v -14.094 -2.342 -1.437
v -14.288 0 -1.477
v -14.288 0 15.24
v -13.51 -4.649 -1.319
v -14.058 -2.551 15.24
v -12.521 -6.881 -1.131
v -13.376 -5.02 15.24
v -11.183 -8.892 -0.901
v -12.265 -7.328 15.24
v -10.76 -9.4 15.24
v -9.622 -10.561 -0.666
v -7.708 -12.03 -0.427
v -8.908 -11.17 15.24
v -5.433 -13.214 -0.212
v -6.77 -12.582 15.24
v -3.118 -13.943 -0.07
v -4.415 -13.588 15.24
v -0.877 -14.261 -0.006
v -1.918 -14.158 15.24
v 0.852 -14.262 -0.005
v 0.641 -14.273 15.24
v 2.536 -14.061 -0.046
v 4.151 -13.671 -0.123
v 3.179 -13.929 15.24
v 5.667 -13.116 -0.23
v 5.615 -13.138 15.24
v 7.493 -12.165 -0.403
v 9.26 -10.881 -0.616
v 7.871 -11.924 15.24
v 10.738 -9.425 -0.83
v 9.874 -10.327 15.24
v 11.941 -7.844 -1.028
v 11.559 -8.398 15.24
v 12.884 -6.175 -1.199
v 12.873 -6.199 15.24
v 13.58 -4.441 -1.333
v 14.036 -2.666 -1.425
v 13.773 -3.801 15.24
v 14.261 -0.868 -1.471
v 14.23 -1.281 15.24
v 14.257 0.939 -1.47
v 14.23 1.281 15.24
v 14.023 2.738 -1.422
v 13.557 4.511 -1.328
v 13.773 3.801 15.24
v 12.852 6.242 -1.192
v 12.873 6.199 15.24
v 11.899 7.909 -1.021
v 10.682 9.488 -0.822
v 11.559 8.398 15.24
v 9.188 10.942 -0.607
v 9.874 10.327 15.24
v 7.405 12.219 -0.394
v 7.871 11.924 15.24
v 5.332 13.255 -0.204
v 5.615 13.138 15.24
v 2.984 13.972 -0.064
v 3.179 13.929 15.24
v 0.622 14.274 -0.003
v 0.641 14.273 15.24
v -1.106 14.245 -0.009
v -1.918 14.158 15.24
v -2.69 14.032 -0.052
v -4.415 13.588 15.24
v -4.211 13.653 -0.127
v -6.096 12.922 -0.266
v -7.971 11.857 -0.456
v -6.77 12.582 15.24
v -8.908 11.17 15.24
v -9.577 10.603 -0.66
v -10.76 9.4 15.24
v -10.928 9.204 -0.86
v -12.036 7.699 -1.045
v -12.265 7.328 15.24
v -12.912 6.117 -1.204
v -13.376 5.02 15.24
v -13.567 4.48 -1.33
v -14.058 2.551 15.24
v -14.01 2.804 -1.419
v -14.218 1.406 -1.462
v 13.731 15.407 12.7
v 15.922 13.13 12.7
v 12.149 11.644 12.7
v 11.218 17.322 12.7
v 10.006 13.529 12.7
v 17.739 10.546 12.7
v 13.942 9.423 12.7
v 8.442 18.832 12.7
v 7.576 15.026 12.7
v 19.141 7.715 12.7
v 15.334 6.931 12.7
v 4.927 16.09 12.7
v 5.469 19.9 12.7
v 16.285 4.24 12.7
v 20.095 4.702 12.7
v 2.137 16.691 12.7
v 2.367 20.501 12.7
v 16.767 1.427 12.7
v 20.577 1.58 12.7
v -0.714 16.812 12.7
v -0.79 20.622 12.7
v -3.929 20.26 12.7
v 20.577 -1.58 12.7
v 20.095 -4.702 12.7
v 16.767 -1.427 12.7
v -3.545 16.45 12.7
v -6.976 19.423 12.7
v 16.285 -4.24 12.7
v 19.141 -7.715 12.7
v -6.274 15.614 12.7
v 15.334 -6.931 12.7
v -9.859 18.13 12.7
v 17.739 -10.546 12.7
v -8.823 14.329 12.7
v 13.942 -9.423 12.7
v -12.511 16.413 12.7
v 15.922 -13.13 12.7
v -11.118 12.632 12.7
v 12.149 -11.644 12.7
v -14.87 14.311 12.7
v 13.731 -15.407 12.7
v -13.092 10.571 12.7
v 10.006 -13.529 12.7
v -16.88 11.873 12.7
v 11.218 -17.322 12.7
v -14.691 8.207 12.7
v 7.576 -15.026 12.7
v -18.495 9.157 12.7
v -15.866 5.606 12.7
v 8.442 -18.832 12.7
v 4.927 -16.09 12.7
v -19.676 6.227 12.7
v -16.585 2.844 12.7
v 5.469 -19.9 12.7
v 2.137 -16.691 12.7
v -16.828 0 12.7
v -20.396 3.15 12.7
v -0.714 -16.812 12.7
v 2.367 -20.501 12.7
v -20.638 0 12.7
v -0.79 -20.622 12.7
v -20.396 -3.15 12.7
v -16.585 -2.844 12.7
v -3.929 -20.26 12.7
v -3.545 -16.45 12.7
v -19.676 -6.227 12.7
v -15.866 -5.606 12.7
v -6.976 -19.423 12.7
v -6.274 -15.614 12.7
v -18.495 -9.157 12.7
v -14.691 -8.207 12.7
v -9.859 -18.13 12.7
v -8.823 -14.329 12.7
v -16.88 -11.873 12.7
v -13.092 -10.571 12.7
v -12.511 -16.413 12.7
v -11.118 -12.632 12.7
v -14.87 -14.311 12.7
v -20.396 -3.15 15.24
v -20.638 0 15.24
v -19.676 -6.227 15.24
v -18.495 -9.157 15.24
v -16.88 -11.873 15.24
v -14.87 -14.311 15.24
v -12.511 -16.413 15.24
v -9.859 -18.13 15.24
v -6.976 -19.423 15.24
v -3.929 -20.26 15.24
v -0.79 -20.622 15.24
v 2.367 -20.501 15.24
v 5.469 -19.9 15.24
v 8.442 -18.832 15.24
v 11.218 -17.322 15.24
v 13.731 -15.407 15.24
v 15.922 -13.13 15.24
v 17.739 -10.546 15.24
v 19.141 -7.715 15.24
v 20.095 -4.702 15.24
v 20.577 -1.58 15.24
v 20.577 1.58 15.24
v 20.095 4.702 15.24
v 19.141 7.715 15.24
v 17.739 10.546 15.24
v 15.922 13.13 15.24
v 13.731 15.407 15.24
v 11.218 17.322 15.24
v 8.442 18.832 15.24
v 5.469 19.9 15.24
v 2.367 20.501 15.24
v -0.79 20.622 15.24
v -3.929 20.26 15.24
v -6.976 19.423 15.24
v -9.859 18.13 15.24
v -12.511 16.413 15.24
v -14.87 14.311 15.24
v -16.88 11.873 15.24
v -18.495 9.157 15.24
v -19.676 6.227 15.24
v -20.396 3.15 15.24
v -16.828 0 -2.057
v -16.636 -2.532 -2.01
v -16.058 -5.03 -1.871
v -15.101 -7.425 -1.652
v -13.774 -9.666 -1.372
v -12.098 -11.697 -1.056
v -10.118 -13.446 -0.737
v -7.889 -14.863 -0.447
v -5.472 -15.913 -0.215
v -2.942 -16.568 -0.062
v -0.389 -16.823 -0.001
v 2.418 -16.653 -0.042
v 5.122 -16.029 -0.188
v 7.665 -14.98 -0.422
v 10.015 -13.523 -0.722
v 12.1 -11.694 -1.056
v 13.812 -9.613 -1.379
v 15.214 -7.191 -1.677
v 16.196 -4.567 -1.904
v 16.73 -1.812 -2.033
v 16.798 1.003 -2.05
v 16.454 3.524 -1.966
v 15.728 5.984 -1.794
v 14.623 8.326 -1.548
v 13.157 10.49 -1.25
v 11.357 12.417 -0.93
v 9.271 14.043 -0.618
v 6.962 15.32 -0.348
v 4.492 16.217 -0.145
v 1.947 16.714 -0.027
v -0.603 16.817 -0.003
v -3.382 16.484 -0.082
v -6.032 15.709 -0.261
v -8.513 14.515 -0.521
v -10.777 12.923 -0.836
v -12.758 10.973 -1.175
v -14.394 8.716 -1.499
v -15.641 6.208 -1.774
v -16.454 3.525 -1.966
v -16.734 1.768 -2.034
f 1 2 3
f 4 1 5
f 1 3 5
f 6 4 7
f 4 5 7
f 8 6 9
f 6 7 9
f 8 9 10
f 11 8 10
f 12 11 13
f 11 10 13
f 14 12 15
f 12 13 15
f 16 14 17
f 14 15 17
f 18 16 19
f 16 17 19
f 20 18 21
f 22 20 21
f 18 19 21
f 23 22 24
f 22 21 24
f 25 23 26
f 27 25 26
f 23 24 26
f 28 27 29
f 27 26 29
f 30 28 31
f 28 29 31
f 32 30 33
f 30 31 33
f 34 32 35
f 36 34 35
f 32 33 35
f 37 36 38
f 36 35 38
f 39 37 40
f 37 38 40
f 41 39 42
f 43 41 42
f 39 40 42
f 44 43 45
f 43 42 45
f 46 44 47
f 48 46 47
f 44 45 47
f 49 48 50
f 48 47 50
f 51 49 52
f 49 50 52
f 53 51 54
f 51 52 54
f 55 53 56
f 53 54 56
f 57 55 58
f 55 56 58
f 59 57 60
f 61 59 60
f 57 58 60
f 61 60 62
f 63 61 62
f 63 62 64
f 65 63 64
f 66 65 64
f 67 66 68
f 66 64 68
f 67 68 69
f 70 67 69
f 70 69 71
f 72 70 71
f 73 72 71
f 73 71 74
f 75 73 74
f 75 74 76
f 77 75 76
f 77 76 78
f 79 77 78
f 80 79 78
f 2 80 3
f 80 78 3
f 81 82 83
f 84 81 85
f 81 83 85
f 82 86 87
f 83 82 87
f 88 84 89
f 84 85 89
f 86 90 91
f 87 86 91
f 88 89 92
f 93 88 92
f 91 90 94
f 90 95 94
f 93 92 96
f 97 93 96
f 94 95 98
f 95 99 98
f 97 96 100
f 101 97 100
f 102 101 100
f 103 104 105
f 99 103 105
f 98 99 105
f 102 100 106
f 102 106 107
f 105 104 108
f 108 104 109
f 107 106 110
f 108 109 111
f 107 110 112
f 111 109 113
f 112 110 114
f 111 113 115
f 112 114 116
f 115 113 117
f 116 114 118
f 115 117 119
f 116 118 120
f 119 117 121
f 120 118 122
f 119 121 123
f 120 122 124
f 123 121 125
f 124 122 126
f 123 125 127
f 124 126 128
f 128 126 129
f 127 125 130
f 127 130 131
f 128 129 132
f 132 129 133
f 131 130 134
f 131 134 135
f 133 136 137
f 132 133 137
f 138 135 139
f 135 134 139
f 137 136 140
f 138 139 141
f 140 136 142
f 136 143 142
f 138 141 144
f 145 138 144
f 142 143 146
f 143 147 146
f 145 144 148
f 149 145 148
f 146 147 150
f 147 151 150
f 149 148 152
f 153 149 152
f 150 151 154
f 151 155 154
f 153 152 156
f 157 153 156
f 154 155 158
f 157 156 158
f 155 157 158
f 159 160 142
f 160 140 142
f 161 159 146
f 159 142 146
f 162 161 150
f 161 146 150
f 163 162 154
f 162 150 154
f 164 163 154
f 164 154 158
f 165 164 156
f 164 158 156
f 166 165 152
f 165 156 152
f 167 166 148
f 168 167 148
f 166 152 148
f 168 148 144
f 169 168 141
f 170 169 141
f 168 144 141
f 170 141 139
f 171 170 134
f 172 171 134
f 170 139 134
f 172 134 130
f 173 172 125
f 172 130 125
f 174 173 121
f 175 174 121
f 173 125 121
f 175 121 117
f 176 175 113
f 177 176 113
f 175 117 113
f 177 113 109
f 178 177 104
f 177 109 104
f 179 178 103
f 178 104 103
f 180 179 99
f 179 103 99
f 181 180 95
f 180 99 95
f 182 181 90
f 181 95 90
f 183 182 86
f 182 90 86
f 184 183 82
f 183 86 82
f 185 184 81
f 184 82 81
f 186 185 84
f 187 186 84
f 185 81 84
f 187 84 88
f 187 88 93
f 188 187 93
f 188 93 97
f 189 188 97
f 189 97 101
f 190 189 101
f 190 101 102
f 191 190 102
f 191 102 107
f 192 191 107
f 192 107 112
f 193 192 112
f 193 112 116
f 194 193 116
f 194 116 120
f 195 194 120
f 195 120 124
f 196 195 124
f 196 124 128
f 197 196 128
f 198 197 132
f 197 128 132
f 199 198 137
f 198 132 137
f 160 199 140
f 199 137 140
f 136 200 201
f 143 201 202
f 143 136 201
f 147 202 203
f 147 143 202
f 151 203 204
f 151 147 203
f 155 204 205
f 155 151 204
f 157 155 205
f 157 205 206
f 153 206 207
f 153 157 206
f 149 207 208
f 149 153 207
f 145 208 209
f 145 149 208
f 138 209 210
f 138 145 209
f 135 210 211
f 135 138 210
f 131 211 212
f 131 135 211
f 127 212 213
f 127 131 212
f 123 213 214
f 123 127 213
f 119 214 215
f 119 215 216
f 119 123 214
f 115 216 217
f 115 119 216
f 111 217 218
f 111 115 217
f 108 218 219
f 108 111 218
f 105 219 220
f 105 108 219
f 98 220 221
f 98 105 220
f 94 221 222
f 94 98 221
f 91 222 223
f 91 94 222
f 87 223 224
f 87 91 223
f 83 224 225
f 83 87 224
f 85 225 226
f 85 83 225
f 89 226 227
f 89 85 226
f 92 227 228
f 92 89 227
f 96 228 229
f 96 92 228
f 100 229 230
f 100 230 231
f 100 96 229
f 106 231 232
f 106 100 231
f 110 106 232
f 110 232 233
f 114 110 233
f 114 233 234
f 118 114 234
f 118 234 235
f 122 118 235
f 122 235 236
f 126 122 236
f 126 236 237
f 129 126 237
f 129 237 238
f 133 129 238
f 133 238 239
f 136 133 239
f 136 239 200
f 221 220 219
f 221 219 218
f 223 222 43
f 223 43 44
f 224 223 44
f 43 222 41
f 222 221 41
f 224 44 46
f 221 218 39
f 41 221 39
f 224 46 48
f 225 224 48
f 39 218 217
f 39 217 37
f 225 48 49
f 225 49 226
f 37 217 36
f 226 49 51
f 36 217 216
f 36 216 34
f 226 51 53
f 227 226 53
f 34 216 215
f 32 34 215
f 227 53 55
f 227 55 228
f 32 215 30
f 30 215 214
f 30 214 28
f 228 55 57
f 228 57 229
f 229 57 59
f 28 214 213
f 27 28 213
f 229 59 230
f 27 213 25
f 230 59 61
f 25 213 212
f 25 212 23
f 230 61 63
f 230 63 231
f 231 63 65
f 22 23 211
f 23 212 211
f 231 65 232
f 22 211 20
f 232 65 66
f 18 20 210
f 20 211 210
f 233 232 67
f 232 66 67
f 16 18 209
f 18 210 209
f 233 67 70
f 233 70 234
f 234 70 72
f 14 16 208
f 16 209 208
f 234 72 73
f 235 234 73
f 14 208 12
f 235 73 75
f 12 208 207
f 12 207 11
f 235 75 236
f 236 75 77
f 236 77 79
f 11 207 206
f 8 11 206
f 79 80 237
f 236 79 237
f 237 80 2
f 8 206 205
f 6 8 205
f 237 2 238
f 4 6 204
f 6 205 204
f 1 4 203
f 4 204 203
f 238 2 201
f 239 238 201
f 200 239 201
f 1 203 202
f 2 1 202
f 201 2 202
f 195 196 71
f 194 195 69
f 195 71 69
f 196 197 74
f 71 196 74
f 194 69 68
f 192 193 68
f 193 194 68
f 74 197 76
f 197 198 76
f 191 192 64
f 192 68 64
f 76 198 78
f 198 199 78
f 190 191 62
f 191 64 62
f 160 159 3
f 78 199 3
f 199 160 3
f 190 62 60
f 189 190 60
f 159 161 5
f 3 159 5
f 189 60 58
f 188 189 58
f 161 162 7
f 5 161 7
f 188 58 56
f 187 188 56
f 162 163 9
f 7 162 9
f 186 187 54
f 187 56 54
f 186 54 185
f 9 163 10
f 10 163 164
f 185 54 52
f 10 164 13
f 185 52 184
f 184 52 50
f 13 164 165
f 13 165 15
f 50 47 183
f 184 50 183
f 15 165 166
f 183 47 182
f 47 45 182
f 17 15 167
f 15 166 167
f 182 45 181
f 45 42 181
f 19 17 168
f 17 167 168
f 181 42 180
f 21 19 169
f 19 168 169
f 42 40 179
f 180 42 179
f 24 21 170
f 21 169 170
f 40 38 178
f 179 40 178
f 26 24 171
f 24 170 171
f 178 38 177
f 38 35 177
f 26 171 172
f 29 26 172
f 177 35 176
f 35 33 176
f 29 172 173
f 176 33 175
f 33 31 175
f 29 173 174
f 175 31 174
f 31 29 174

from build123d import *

# Parameters (mm, degrees)
F0_W          = 2.54
F0_H          = 12.7
F3_DEPTH      = 25.4
F2_R          = 69.85
F4_DEPTH      = 25.4
F4_DEPTH_BACK = 25.4


with BuildPart() as f1:
    # F0 (on Front) → F1 (revolve)
    with BuildSketch(Plane.XZ):
        with Locations((-15.5575, 6.35)):
            Rectangle(F0_W, F0_H)
        Polygon((-16.8275, 12.7), (-14.2875, 12.7), (-14.2875, 15.24), (-20.6375, 15.24), (-20.6375, 12.7), align=None)
    revolve(axis=Axis((0, 0, 10.8147247049), (0, 0, 1)))

    # F3 (add): a face of the model
    f3_faces = [f1.faces().sort_by_distance(p)[0] for p in [
        (16.3515464256, 0, 0),
    ]]
    extrude(f3_faces, amount=F3_DEPTH)

    # F2 (on Front) → F4 (cut, two sides)
    with BuildSketch(Plane.XZ) as f4_sk:
        with Locations((0, -69.85)):
            Circle(F2_R)
    extrude(amount=-F4_DEPTH, mode=Mode.SUBTRACT)
    extrude(f4_sk.sketch, amount=F4_DEPTH_BACK, mode=Mode.SUBTRACT)


solid = f1.part
